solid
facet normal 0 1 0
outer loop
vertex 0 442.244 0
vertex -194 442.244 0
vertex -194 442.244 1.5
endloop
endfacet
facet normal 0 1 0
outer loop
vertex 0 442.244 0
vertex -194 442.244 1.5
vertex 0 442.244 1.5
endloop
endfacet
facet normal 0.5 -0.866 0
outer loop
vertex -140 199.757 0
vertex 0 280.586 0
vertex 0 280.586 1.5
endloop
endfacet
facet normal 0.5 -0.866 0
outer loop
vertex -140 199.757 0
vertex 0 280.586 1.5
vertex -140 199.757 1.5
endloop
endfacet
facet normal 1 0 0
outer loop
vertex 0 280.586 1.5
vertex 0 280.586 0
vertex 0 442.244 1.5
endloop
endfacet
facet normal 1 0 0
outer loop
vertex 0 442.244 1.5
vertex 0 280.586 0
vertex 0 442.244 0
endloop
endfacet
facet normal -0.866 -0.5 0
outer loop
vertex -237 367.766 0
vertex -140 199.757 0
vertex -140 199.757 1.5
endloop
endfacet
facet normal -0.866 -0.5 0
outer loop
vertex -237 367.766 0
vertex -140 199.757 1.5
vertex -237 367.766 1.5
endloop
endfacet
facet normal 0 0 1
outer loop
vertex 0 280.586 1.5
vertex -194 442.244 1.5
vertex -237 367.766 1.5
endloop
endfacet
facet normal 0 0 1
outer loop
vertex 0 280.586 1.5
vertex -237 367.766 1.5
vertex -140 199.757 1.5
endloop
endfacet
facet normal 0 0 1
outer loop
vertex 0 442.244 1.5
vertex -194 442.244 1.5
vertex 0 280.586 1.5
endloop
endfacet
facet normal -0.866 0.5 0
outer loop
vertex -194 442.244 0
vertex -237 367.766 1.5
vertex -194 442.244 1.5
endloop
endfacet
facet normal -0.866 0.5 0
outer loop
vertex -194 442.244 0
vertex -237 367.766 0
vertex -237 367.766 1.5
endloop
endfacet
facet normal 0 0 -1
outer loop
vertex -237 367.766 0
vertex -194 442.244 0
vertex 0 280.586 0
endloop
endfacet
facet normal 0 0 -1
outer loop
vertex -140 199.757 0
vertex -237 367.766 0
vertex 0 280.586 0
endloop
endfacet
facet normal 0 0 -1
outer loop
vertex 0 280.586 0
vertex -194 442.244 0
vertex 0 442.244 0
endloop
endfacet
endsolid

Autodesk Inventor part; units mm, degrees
ref_plane "YZ Plane" through (0, 0, 0) normal (1, 0, 0) x (0, 1, 0)
ref_plane "XZ Plane" through (0, 0, 0) normal (0, 1, 0) x (-1, 0, 0)
ref_plane "XY Plane" through (0, 0, 0) normal (0, 0, 1) x (1, 0, 0)
sketch "Sketch1" plane through (0, 0, 0) normal (0, 0, 1) x (1, 0, 0)
  arc A0 (-16.5011, 13.8506) -> (-21.6973, 4.8506) centre (-16.5011, 7.8506) ccw projected
  line L0 (-16.5011, 13.8506) -> (16.5011, 13.8506) projected
  arc A1 (21.6973, 4.8506) -> (16.5011, 13.8506) centre (16.5011, 7.8506) ccw projected
  line L1 (21.6973, 4.8506) -> (13.3257, -9.6494) projected
  arc A2 (5.5315, -14.1494) -> (13.3257, -9.6494) centre (5.5315, -5.1494) ccw projected
  line L2 (5.5315, -14.1494) -> (-5.5315, -14.1494) projected
  arc A3 (-13.3257, -9.6494) -> (-5.5315, -14.1494) centre (-5.5315, -5.1494) ccw projected
  line L3 (-13.3257, -9.6494) -> (-21.6973, 4.8506) projected
  line L4 (10, -20.5494) -> (10, -40.5494) projected
  line L5 (10, -40.5494) -> (-10, -40.5494) projected
  line L6 (-10, -40.5494) -> (-10, -20.5494) projected
  line L7 (-10, -20.5494) -> (10, -20.5494) projected
  line L8 (-43, 31.7481) -> (-15, -16.7494) projected
  line L9 (-15, -16.7494) -> (-32.2735, -26.7222) projected
  arc A4 (-32.2735, -26.7222) -> (32.2735, -26.7222) centre (0, -5.7301) ccw projected
  line L10 (32.2735, -26.7222) -> (15, -16.7494) projected
  line L11 (15, -16.7494) -> (43, 31.7481) projected
  line L12 (43, 31.7481) -> (38.6699, 34.2481) projected
  line L13 (38.6699, 34.2481) -> (31.7143, 22.2006) projected
  arc A5 (23.4871, 17.4506) -> (31.7143, 22.2006) centre (23.4871, 26.9506) ccw projected
  line L14 (23.4871, 17.4506) -> (-23.4871, 17.4506) projected
  arc A6 (-31.7143, 22.2006) -> (-23.4871, 17.4506) centre (-23.4871, 26.9506) ccw projected
  line L15 (-31.7143, 22.2006) -> (-38.6699, 34.2481) projected
  line L16 (-38.6699, 34.2481) -> (-43, 31.7481) projected
  arc A7 (-222.7491, 428.2441) -> (-227.9453, 437.2441) centre (-227.9453, 431.2441) ccw projected
  line L17 (-222.7491, 428.2441) -> (-239.2502, 399.6633) projected
  arc A8 (-249.6425, 399.6633) -> (-239.2502, 399.6633) centre (-244.4464, 402.6633) ccw projected
  line L18 (-249.6425, 399.6633) -> (-258.0141, 414.1633) projected
  arc A9 (-258.0141, 423.1633) -> (-258.0141, 414.1633) centre (-250.2199, 418.6633) ccw projected
  line L19 (-258.0141, 423.1633) -> (-252.4827, 432.7441) projected
  arc A10 (-244.6884, 437.2441) -> (-252.4827, 432.7441) centre (-244.6884, 428.2441) ccw projected
  line L20 (-244.6884, 437.2441) -> (-227.9453, 437.2441) projected
  line L21 (-265.791, 422.4934) -> (-283.1115, 432.4934) projected
  line L22 (-283.1115, 432.4934) -> (-273.1115, 449.8139) projected
  line L23 (-273.1115, 449.8139) -> (-255.791, 439.8139) projected
  line L24 (-255.791, 439.8139) -> (-265.791, 422.4934) projected
  line L25 (-194.0001, 442.2441) -> (-250.0001, 442.2441) projected
  line L26 (-250.0001, 442.2441) -> (-250.0001, 462.1898) projected
  arc A11 (-250.0001, 462.1898) -> (-282.2736, 406.2904) centre (-247.9571, 423.7441) ccw projected
  line L27 (-282.2736, 406.2904) -> (-265.0001, 416.2633) projected
  line L28 (-265.0001, 416.2633) -> (-237.0001, 367.7659) projected
  line L29 (-237.0001, 367.7659) -> (-232.6699, 370.2659) projected
  line L30 (-232.6699, 370.2659) -> (-239.6255, 382.3133) projected
  arc A12 (-239.6255, 391.8133) -> (-239.6255, 382.3133) centre (-231.3983, 387.0633) ccw projected
  line L31 (-239.6255, 391.8133) -> (-216.1385, 432.4941) projected
  arc A13 (-207.9112, 437.2441) -> (-216.1385, 432.4941) centre (-207.9112, 427.7441) ccw projected
  line L32 (-207.9112, 437.2441) -> (-194.0001, 437.2441) projected
  line L33 (-194.0001, 437.2441) -> (-194.0001, 442.2441) projected
  arc A14 (239.2501, 399.6635) -> (249.6424, 399.6635) centre (244.4463, 402.6635) ccw projected
  line L34 (239.2501, 399.6635) -> (222.749, 428.2443) projected
  arc A15 (227.9452, 437.2443) -> (222.749, 428.2443) centre (227.9452, 431.2443) ccw projected
  line L35 (227.9452, 437.2443) -> (244.6883, 437.2443) projected
  arc A16 (252.4825, 432.7443) -> (244.6883, 437.2443) centre (244.6883, 428.2443) ccw projected
  line L36 (252.4825, 432.7443) -> (258.014, 423.1635) projected
  arc A17 (258.014, 414.1635) -> (258.014, 423.1635) centre (250.2198, 418.6635) ccw projected
  line L37 (258.014, 414.1635) -> (249.6424, 399.6635) projected
  line L38 (255.7908, 439.8142) -> (273.1113, 449.8142) projected
  line L39 (273.1113, 449.8142) -> (283.1113, 432.4937) projected
  line L40 (283.1113, 432.4937) -> (265.7908, 422.4937) projected
  line L41 (265.7908, 422.4937) -> (255.7908, 439.8142) projected
  line L42 (237, 367.7661) -> (264.9999, 416.2635) projected
  line L43 (264.9999, 416.2635) -> (282.2735, 406.2907) projected
  arc A18 (282.2735, 406.2907) -> (249.9999, 462.19) centre (247.957, 423.7443) ccw projected
  line L44 (249.9999, 462.19) -> (249.9999, 442.2443) projected
  line L45 (249.9999, 442.2443) -> (193.9999, 442.2443) projected
  line L46 (193.9999, 442.2443) -> (193.9999, 437.2443) projected
  line L47 (193.9999, 437.2443) -> (207.9111, 437.2443) projected
  arc A19 (216.1383, 432.4943) -> (207.9111, 437.2443) centre (207.9111, 427.7443) ccw projected
  line L48 (216.1383, 432.4943) -> (239.6254, 391.8135) projected
  arc A20 (239.6254, 382.3135) -> (239.6254, 391.8135) centre (231.3982, 387.0635) ccw projected
  line L49 (239.6254, 382.3135) -> (232.6699, 370.2661) projected
  line L50 (232.6699, 370.2661) -> (237, 367.7661) projected
  line L51 (-194.0001, 442.2441) -> (193.9999, 442.2443)
  line L52 (193.9999, 442.2443) -> (237, 367.7661)
  line L53 (237, 367.7661) -> (43, 31.7481)
  line L54 (43, 31.7481) -> (-43, 31.7481)
  line L55 (-43, 31.7481) -> (-237.0001, 367.7659)
  line L56 (-237.0001, 367.7659) -> (-194.0001, 442.2441)
  line L57 (-247.9571, 423.7441) -> (0, 280.5861)
  line L58 (247.957, 423.7443) -> (0, 280.5861)
  line L59 (0, -5.7301) -> (0, 280.5861)
  line L60 (0, 280.5861) -> (140, 199.7571)
  line L61 (0, 280.5861) -> (-140, 199.757)
  line L62 (0, 280.5861) -> (-0.0001, 442.2442)
  point P0 (0, 0)
extrude "Extrusion1" add sketch "Sketch1" along normal blind 1.5 contours L61 L55 L29 L30 L56 L57 | L57 L56 L32 L33 L51 L62 | L30 L29 L56 | L56 L33 L32
properties part number "alu plate" material "Glass"
